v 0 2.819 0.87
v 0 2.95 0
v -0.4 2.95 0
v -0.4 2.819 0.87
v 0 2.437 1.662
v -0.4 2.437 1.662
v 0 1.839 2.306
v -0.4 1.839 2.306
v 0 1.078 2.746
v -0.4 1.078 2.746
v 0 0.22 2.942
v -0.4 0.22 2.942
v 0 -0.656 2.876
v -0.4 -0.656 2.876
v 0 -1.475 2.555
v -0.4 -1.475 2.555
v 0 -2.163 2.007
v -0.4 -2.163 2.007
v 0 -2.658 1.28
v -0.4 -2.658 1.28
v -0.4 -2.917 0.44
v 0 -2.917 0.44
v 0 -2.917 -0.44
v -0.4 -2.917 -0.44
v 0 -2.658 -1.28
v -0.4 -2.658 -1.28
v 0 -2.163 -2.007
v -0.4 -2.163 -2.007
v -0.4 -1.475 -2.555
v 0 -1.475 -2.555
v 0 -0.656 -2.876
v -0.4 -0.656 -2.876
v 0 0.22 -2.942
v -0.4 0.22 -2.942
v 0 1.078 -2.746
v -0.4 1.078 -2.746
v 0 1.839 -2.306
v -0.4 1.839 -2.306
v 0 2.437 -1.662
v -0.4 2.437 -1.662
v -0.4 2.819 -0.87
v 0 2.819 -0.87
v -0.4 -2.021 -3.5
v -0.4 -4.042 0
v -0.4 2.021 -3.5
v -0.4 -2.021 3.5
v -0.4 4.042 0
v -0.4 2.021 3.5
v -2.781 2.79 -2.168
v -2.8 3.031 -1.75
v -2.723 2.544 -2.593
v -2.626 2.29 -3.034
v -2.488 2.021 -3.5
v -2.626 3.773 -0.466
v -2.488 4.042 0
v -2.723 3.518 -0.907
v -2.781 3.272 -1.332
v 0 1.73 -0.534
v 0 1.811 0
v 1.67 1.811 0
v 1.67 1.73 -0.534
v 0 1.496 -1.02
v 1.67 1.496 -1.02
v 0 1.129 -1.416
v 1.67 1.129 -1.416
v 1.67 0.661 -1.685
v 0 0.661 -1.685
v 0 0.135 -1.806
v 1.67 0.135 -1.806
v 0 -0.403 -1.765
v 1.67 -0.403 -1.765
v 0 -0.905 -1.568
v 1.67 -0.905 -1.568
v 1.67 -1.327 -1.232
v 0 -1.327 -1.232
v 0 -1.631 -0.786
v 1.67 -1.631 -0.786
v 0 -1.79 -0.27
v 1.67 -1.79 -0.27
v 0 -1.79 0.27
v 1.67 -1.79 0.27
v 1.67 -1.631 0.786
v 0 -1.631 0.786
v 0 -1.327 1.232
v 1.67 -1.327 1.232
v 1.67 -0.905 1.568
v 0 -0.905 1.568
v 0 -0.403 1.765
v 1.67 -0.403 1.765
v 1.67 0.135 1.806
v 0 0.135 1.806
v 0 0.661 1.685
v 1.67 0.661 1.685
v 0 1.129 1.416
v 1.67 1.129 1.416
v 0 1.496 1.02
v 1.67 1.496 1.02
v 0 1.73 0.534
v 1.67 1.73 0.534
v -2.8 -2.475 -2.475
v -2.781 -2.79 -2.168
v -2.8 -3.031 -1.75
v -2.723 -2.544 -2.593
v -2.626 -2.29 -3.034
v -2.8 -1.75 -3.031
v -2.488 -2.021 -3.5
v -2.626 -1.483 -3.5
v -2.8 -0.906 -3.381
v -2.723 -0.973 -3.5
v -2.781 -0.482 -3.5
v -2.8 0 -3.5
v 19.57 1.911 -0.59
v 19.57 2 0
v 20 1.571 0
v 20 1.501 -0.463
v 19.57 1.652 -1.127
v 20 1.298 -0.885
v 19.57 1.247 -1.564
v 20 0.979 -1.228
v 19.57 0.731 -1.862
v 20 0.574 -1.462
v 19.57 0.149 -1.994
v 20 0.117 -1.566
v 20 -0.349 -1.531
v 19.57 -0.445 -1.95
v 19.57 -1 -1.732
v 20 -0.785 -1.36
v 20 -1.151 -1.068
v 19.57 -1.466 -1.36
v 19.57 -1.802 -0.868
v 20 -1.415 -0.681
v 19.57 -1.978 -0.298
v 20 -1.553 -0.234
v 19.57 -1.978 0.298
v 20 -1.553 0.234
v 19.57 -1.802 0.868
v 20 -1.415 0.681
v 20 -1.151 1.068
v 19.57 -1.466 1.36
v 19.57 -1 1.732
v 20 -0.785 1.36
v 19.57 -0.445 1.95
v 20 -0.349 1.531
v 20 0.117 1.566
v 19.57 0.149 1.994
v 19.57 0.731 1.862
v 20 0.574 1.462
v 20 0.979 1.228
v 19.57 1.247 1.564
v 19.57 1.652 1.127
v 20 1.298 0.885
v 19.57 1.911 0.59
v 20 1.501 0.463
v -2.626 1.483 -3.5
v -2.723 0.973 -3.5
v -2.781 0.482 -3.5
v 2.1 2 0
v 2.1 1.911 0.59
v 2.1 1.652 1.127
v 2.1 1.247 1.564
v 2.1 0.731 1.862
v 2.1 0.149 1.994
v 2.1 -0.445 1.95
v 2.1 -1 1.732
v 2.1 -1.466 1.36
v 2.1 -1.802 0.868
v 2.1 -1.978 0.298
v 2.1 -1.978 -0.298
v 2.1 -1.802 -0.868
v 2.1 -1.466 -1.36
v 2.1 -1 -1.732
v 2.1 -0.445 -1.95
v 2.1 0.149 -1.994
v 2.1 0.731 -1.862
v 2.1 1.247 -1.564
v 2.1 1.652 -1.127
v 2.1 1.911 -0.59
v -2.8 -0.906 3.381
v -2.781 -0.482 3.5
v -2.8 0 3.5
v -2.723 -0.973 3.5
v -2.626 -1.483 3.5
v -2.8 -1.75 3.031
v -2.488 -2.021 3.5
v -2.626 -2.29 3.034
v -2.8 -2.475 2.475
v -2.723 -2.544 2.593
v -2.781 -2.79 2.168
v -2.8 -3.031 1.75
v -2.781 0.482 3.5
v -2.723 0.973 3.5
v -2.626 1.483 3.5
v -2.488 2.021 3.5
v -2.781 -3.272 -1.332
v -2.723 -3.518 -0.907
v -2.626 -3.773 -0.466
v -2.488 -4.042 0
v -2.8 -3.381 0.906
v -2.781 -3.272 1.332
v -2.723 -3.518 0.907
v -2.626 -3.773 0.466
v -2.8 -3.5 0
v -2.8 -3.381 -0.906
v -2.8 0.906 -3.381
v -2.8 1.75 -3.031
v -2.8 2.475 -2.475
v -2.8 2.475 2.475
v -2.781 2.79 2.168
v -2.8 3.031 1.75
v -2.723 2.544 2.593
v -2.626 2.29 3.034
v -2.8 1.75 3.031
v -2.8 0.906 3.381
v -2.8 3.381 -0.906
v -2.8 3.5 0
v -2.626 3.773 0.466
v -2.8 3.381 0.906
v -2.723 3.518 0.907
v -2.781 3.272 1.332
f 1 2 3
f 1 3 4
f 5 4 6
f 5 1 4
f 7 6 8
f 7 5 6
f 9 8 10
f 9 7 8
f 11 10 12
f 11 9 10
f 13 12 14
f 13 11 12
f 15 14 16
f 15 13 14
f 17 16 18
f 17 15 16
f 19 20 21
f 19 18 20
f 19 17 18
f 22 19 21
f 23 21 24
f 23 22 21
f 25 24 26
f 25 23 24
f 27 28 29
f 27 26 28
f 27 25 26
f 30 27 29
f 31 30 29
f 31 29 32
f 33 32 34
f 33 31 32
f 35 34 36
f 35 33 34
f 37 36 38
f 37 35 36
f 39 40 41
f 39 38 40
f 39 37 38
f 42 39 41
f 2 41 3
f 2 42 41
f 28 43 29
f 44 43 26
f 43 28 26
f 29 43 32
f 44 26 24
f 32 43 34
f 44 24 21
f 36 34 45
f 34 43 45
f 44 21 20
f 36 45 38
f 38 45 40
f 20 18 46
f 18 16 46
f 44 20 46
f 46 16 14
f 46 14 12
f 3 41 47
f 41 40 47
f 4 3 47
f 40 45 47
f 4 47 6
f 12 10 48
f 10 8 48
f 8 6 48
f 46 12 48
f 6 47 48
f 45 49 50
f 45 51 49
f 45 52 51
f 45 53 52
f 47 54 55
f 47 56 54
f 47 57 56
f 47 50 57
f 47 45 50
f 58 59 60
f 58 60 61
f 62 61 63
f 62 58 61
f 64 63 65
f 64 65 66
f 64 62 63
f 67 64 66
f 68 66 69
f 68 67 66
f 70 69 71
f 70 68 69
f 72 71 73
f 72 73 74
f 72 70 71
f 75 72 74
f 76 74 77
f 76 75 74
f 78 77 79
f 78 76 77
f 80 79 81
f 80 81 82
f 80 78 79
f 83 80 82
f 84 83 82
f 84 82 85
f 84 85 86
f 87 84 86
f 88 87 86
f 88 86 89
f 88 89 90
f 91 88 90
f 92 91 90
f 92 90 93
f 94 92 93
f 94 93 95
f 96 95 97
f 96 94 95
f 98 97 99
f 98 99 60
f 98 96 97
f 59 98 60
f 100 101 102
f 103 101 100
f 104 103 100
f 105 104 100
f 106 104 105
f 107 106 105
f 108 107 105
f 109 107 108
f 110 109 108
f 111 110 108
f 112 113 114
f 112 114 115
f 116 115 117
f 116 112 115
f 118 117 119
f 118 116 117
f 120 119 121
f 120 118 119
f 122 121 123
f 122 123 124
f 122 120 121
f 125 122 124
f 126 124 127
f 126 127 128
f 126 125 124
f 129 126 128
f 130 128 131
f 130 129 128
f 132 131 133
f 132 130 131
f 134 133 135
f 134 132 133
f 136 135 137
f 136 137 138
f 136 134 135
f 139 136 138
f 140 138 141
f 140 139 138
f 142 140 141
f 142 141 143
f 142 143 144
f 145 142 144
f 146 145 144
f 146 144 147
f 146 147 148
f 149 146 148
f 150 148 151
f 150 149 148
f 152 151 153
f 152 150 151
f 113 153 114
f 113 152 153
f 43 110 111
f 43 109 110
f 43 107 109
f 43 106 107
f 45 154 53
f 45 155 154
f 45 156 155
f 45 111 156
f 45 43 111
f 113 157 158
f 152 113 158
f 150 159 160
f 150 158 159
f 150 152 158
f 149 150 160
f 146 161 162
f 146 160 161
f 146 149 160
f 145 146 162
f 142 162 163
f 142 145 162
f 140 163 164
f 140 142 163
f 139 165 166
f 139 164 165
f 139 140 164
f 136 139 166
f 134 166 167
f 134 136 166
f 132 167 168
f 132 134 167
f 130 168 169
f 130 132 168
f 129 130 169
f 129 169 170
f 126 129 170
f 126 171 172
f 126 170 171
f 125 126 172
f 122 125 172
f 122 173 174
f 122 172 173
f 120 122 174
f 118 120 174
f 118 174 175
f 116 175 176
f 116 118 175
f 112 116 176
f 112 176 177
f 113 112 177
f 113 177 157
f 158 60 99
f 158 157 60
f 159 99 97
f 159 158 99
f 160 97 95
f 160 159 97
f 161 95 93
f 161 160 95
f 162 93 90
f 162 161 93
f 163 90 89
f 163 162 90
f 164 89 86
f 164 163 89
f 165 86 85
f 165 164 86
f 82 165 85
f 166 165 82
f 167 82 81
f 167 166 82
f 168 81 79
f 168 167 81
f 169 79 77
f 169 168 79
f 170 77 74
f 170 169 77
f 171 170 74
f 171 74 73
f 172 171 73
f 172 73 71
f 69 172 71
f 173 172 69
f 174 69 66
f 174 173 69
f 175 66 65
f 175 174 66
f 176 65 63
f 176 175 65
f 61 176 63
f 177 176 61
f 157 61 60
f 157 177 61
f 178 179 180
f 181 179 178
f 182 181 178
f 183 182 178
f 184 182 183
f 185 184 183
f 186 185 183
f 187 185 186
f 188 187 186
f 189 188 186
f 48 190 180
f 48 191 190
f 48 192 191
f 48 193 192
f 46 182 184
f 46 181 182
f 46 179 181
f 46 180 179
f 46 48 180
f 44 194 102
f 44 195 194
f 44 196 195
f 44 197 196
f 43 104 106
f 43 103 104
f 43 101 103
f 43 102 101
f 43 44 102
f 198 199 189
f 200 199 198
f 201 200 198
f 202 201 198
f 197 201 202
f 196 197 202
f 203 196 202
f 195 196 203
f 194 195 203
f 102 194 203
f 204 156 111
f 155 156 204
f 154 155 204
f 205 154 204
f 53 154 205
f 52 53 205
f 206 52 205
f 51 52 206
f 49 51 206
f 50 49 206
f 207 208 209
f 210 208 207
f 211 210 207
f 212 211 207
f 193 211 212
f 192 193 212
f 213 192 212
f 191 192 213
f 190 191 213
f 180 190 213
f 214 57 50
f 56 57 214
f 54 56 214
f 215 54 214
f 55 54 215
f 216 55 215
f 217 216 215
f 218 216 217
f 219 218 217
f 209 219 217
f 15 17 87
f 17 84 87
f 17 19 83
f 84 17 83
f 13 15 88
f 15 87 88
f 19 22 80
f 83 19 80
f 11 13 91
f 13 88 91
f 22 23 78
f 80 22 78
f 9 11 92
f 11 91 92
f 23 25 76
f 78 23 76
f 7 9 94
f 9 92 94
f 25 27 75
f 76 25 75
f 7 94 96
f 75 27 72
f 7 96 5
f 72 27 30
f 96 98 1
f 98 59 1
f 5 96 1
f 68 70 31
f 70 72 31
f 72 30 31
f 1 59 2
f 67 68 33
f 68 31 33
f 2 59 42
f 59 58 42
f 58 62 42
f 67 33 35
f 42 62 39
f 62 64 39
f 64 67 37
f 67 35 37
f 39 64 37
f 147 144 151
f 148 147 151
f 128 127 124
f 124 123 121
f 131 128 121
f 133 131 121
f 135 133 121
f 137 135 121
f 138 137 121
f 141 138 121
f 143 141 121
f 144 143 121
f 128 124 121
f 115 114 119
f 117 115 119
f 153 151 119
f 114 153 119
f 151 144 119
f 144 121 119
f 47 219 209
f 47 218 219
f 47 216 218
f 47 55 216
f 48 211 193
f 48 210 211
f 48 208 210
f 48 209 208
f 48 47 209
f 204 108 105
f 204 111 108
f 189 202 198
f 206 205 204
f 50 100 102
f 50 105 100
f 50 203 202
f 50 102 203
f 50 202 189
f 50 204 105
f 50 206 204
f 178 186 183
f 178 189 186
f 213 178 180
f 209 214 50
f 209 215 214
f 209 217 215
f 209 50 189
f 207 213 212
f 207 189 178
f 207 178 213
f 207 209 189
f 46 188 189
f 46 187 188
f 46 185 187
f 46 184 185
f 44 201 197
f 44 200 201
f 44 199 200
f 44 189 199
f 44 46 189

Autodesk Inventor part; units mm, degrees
ref_plane "YZ Plane" through (0, 0, 0) normal (1, 0, 0) x (0, 1, 0)
ref_plane "XZ Plane" through (0, 0, 0) normal (0, 1, 0) x (-1, 0, 0)
sketch "Sketch1" plane through (0, 0, 0) normal (0, 0, 1) x (1, 0, 0)
  line L0 (0, 2.95) -> (0, 1.8106)
  line L1 (2.1, 2) -> (20, 2)
  line L2 (20, 2) -> (20, 0)
  line L3 (20, 0) -> (-0.4001, 0)
  line L4 (-4.4801, 0) -> (24.08, 0) projected
  line L5 (-0.4001, 0) -> (-0.4001, 2.95)
  line L6 (-0.4001, 2.95) -> (0, 2.95)
  line L7 (2.1, 2) -> (1.6705, 1.8106)
  line L8 (1.6705, 1.8106) -> (0, 1.8106)
  line L9 (0, -0.59) -> (0, 3.54) projected
  dimension "d0" = 20
  dimension "d1" = 17.9
  dimension "d2" = 4
  dimension "d9" = 0.4001
  dimension "d10" = 5.9
  dimension "d13" = 0.4295
  dimension "d14" = 3.6211
revolve "Body" add sketch "Sketch1" angle 360 about axis through (20, 0, 0) along (-1, 0, 0)
sketch "Sketch2" plane through (-0.4001, 0, 0) normal (-1, 0, 0) x (0, 0, 1)
  line L0 (0, 4.0415) -> (3.5, 2.0207)
  line L1 (3.5, 2.0207) -> (3.5, -2.0207)
  line L2 (3.5, -2.0207) -> (0, -4.0415)
  line L3 (0, -4.0415) -> (-3.5, -2.0207)
  line L4 (-3.5, -2.0207) -> (-3.5, 2.0207)
  line L5 (-3.5, 2.0207) -> (0, 4.0415)
  point P0 (0, 0)
  point P1 (0, 0)
  dimension "d11" = 7
extrude "Head" add sketch "Sketch2" along normal blind 2.4
sketch "Sketch4" plane through (0, 0, 0) normal (0, 0, 1) x (1, 0, 0)
  line L0 (-2.8001, 3.5) -> (-2.8001, 4.0415)
  line L1 (-2.8001, 4.0415) -> (-2.4875, 4.0415)
  line L2 (-2.4875, 4.0415) -> (-2.8001, 3.5)
  line L3 (-3.2801, 0) -> (0.0799, 0) projected
  line L4 (-0.4001, 4.0415) -> (-2.8001, 4.0415) projected
  line L5 (-2.8001, 2.0207) -> (-2.8001, 4.0415) projected
  dimension "d5" = 30
  dimension "d19" = 7
revolve "Chamfer1" cut sketch "Sketch4" angle 360 about axis through (-10, 0, 0) along (1, 0, 0)
thread "Thread" size "M4x0.7" class "6g" standard "ISO Metric profile" length 17.9
chamfer "Chamfer2" distance 0.4294 distance2 0.4295 1 edges at (20, -2, 0) measured on face at (20, -0.5903, 0.3098)
ref_plane "Work Plane1" through (1.525, 0, 0) normal (0, 0, 1) x (1, 0, 0)
equation "\"d0\" = NLG"
equation "\"d1\" = GEL"
equation "\"d2\" = GD"
equation "\"d10\" = SD2"
equation "\"d14\" = BDM"
equation "\"d11\" = SW"
equation "\"d3\" = KOH - SD"
equation "\"d5\" = ANG1"
equation "\"d19\" = SW0"
equation "\"d15\" = GEL"
equation "\"d6\" = -0.5 * SPD + 0.5 * GD"
equation "\"NLG\" = 20"
equation "\"GD\" = NND"
equation "\"BDM\" = 3.62111"
equation "\"KOH\" = 2.8"
equation "\"GEL\" = 17.9"
equation "\"SW\" = 7"
equation "\"SW0\" = 7"
equation "\"SPD\" = NND - 1.2269 * PTC"
equation "\"SD2\" = 5.9"
equation "\"SD\" = 0.4"
equation "\"ANG1\" = 30deg"
equation "\"GAL\" = 0.61345 * PTC"
equation "\"GUL\" = 0.61345 * PTC"
equation "\"RR\" = 0.2"
equation "\"GD1\" = THREADDIA - 1.2269 * PTC"
equation "\"THREADDIA\" = 4"
equation "\"TOA\" = 30deg"
equation "\"PTC\" = 0.7"
equation "\"NND\" = 4"
equation "\"E0\" = 1.155 * SW"
properties part number "DIN 933 - M4  x 20" material "Steel, Mild"
